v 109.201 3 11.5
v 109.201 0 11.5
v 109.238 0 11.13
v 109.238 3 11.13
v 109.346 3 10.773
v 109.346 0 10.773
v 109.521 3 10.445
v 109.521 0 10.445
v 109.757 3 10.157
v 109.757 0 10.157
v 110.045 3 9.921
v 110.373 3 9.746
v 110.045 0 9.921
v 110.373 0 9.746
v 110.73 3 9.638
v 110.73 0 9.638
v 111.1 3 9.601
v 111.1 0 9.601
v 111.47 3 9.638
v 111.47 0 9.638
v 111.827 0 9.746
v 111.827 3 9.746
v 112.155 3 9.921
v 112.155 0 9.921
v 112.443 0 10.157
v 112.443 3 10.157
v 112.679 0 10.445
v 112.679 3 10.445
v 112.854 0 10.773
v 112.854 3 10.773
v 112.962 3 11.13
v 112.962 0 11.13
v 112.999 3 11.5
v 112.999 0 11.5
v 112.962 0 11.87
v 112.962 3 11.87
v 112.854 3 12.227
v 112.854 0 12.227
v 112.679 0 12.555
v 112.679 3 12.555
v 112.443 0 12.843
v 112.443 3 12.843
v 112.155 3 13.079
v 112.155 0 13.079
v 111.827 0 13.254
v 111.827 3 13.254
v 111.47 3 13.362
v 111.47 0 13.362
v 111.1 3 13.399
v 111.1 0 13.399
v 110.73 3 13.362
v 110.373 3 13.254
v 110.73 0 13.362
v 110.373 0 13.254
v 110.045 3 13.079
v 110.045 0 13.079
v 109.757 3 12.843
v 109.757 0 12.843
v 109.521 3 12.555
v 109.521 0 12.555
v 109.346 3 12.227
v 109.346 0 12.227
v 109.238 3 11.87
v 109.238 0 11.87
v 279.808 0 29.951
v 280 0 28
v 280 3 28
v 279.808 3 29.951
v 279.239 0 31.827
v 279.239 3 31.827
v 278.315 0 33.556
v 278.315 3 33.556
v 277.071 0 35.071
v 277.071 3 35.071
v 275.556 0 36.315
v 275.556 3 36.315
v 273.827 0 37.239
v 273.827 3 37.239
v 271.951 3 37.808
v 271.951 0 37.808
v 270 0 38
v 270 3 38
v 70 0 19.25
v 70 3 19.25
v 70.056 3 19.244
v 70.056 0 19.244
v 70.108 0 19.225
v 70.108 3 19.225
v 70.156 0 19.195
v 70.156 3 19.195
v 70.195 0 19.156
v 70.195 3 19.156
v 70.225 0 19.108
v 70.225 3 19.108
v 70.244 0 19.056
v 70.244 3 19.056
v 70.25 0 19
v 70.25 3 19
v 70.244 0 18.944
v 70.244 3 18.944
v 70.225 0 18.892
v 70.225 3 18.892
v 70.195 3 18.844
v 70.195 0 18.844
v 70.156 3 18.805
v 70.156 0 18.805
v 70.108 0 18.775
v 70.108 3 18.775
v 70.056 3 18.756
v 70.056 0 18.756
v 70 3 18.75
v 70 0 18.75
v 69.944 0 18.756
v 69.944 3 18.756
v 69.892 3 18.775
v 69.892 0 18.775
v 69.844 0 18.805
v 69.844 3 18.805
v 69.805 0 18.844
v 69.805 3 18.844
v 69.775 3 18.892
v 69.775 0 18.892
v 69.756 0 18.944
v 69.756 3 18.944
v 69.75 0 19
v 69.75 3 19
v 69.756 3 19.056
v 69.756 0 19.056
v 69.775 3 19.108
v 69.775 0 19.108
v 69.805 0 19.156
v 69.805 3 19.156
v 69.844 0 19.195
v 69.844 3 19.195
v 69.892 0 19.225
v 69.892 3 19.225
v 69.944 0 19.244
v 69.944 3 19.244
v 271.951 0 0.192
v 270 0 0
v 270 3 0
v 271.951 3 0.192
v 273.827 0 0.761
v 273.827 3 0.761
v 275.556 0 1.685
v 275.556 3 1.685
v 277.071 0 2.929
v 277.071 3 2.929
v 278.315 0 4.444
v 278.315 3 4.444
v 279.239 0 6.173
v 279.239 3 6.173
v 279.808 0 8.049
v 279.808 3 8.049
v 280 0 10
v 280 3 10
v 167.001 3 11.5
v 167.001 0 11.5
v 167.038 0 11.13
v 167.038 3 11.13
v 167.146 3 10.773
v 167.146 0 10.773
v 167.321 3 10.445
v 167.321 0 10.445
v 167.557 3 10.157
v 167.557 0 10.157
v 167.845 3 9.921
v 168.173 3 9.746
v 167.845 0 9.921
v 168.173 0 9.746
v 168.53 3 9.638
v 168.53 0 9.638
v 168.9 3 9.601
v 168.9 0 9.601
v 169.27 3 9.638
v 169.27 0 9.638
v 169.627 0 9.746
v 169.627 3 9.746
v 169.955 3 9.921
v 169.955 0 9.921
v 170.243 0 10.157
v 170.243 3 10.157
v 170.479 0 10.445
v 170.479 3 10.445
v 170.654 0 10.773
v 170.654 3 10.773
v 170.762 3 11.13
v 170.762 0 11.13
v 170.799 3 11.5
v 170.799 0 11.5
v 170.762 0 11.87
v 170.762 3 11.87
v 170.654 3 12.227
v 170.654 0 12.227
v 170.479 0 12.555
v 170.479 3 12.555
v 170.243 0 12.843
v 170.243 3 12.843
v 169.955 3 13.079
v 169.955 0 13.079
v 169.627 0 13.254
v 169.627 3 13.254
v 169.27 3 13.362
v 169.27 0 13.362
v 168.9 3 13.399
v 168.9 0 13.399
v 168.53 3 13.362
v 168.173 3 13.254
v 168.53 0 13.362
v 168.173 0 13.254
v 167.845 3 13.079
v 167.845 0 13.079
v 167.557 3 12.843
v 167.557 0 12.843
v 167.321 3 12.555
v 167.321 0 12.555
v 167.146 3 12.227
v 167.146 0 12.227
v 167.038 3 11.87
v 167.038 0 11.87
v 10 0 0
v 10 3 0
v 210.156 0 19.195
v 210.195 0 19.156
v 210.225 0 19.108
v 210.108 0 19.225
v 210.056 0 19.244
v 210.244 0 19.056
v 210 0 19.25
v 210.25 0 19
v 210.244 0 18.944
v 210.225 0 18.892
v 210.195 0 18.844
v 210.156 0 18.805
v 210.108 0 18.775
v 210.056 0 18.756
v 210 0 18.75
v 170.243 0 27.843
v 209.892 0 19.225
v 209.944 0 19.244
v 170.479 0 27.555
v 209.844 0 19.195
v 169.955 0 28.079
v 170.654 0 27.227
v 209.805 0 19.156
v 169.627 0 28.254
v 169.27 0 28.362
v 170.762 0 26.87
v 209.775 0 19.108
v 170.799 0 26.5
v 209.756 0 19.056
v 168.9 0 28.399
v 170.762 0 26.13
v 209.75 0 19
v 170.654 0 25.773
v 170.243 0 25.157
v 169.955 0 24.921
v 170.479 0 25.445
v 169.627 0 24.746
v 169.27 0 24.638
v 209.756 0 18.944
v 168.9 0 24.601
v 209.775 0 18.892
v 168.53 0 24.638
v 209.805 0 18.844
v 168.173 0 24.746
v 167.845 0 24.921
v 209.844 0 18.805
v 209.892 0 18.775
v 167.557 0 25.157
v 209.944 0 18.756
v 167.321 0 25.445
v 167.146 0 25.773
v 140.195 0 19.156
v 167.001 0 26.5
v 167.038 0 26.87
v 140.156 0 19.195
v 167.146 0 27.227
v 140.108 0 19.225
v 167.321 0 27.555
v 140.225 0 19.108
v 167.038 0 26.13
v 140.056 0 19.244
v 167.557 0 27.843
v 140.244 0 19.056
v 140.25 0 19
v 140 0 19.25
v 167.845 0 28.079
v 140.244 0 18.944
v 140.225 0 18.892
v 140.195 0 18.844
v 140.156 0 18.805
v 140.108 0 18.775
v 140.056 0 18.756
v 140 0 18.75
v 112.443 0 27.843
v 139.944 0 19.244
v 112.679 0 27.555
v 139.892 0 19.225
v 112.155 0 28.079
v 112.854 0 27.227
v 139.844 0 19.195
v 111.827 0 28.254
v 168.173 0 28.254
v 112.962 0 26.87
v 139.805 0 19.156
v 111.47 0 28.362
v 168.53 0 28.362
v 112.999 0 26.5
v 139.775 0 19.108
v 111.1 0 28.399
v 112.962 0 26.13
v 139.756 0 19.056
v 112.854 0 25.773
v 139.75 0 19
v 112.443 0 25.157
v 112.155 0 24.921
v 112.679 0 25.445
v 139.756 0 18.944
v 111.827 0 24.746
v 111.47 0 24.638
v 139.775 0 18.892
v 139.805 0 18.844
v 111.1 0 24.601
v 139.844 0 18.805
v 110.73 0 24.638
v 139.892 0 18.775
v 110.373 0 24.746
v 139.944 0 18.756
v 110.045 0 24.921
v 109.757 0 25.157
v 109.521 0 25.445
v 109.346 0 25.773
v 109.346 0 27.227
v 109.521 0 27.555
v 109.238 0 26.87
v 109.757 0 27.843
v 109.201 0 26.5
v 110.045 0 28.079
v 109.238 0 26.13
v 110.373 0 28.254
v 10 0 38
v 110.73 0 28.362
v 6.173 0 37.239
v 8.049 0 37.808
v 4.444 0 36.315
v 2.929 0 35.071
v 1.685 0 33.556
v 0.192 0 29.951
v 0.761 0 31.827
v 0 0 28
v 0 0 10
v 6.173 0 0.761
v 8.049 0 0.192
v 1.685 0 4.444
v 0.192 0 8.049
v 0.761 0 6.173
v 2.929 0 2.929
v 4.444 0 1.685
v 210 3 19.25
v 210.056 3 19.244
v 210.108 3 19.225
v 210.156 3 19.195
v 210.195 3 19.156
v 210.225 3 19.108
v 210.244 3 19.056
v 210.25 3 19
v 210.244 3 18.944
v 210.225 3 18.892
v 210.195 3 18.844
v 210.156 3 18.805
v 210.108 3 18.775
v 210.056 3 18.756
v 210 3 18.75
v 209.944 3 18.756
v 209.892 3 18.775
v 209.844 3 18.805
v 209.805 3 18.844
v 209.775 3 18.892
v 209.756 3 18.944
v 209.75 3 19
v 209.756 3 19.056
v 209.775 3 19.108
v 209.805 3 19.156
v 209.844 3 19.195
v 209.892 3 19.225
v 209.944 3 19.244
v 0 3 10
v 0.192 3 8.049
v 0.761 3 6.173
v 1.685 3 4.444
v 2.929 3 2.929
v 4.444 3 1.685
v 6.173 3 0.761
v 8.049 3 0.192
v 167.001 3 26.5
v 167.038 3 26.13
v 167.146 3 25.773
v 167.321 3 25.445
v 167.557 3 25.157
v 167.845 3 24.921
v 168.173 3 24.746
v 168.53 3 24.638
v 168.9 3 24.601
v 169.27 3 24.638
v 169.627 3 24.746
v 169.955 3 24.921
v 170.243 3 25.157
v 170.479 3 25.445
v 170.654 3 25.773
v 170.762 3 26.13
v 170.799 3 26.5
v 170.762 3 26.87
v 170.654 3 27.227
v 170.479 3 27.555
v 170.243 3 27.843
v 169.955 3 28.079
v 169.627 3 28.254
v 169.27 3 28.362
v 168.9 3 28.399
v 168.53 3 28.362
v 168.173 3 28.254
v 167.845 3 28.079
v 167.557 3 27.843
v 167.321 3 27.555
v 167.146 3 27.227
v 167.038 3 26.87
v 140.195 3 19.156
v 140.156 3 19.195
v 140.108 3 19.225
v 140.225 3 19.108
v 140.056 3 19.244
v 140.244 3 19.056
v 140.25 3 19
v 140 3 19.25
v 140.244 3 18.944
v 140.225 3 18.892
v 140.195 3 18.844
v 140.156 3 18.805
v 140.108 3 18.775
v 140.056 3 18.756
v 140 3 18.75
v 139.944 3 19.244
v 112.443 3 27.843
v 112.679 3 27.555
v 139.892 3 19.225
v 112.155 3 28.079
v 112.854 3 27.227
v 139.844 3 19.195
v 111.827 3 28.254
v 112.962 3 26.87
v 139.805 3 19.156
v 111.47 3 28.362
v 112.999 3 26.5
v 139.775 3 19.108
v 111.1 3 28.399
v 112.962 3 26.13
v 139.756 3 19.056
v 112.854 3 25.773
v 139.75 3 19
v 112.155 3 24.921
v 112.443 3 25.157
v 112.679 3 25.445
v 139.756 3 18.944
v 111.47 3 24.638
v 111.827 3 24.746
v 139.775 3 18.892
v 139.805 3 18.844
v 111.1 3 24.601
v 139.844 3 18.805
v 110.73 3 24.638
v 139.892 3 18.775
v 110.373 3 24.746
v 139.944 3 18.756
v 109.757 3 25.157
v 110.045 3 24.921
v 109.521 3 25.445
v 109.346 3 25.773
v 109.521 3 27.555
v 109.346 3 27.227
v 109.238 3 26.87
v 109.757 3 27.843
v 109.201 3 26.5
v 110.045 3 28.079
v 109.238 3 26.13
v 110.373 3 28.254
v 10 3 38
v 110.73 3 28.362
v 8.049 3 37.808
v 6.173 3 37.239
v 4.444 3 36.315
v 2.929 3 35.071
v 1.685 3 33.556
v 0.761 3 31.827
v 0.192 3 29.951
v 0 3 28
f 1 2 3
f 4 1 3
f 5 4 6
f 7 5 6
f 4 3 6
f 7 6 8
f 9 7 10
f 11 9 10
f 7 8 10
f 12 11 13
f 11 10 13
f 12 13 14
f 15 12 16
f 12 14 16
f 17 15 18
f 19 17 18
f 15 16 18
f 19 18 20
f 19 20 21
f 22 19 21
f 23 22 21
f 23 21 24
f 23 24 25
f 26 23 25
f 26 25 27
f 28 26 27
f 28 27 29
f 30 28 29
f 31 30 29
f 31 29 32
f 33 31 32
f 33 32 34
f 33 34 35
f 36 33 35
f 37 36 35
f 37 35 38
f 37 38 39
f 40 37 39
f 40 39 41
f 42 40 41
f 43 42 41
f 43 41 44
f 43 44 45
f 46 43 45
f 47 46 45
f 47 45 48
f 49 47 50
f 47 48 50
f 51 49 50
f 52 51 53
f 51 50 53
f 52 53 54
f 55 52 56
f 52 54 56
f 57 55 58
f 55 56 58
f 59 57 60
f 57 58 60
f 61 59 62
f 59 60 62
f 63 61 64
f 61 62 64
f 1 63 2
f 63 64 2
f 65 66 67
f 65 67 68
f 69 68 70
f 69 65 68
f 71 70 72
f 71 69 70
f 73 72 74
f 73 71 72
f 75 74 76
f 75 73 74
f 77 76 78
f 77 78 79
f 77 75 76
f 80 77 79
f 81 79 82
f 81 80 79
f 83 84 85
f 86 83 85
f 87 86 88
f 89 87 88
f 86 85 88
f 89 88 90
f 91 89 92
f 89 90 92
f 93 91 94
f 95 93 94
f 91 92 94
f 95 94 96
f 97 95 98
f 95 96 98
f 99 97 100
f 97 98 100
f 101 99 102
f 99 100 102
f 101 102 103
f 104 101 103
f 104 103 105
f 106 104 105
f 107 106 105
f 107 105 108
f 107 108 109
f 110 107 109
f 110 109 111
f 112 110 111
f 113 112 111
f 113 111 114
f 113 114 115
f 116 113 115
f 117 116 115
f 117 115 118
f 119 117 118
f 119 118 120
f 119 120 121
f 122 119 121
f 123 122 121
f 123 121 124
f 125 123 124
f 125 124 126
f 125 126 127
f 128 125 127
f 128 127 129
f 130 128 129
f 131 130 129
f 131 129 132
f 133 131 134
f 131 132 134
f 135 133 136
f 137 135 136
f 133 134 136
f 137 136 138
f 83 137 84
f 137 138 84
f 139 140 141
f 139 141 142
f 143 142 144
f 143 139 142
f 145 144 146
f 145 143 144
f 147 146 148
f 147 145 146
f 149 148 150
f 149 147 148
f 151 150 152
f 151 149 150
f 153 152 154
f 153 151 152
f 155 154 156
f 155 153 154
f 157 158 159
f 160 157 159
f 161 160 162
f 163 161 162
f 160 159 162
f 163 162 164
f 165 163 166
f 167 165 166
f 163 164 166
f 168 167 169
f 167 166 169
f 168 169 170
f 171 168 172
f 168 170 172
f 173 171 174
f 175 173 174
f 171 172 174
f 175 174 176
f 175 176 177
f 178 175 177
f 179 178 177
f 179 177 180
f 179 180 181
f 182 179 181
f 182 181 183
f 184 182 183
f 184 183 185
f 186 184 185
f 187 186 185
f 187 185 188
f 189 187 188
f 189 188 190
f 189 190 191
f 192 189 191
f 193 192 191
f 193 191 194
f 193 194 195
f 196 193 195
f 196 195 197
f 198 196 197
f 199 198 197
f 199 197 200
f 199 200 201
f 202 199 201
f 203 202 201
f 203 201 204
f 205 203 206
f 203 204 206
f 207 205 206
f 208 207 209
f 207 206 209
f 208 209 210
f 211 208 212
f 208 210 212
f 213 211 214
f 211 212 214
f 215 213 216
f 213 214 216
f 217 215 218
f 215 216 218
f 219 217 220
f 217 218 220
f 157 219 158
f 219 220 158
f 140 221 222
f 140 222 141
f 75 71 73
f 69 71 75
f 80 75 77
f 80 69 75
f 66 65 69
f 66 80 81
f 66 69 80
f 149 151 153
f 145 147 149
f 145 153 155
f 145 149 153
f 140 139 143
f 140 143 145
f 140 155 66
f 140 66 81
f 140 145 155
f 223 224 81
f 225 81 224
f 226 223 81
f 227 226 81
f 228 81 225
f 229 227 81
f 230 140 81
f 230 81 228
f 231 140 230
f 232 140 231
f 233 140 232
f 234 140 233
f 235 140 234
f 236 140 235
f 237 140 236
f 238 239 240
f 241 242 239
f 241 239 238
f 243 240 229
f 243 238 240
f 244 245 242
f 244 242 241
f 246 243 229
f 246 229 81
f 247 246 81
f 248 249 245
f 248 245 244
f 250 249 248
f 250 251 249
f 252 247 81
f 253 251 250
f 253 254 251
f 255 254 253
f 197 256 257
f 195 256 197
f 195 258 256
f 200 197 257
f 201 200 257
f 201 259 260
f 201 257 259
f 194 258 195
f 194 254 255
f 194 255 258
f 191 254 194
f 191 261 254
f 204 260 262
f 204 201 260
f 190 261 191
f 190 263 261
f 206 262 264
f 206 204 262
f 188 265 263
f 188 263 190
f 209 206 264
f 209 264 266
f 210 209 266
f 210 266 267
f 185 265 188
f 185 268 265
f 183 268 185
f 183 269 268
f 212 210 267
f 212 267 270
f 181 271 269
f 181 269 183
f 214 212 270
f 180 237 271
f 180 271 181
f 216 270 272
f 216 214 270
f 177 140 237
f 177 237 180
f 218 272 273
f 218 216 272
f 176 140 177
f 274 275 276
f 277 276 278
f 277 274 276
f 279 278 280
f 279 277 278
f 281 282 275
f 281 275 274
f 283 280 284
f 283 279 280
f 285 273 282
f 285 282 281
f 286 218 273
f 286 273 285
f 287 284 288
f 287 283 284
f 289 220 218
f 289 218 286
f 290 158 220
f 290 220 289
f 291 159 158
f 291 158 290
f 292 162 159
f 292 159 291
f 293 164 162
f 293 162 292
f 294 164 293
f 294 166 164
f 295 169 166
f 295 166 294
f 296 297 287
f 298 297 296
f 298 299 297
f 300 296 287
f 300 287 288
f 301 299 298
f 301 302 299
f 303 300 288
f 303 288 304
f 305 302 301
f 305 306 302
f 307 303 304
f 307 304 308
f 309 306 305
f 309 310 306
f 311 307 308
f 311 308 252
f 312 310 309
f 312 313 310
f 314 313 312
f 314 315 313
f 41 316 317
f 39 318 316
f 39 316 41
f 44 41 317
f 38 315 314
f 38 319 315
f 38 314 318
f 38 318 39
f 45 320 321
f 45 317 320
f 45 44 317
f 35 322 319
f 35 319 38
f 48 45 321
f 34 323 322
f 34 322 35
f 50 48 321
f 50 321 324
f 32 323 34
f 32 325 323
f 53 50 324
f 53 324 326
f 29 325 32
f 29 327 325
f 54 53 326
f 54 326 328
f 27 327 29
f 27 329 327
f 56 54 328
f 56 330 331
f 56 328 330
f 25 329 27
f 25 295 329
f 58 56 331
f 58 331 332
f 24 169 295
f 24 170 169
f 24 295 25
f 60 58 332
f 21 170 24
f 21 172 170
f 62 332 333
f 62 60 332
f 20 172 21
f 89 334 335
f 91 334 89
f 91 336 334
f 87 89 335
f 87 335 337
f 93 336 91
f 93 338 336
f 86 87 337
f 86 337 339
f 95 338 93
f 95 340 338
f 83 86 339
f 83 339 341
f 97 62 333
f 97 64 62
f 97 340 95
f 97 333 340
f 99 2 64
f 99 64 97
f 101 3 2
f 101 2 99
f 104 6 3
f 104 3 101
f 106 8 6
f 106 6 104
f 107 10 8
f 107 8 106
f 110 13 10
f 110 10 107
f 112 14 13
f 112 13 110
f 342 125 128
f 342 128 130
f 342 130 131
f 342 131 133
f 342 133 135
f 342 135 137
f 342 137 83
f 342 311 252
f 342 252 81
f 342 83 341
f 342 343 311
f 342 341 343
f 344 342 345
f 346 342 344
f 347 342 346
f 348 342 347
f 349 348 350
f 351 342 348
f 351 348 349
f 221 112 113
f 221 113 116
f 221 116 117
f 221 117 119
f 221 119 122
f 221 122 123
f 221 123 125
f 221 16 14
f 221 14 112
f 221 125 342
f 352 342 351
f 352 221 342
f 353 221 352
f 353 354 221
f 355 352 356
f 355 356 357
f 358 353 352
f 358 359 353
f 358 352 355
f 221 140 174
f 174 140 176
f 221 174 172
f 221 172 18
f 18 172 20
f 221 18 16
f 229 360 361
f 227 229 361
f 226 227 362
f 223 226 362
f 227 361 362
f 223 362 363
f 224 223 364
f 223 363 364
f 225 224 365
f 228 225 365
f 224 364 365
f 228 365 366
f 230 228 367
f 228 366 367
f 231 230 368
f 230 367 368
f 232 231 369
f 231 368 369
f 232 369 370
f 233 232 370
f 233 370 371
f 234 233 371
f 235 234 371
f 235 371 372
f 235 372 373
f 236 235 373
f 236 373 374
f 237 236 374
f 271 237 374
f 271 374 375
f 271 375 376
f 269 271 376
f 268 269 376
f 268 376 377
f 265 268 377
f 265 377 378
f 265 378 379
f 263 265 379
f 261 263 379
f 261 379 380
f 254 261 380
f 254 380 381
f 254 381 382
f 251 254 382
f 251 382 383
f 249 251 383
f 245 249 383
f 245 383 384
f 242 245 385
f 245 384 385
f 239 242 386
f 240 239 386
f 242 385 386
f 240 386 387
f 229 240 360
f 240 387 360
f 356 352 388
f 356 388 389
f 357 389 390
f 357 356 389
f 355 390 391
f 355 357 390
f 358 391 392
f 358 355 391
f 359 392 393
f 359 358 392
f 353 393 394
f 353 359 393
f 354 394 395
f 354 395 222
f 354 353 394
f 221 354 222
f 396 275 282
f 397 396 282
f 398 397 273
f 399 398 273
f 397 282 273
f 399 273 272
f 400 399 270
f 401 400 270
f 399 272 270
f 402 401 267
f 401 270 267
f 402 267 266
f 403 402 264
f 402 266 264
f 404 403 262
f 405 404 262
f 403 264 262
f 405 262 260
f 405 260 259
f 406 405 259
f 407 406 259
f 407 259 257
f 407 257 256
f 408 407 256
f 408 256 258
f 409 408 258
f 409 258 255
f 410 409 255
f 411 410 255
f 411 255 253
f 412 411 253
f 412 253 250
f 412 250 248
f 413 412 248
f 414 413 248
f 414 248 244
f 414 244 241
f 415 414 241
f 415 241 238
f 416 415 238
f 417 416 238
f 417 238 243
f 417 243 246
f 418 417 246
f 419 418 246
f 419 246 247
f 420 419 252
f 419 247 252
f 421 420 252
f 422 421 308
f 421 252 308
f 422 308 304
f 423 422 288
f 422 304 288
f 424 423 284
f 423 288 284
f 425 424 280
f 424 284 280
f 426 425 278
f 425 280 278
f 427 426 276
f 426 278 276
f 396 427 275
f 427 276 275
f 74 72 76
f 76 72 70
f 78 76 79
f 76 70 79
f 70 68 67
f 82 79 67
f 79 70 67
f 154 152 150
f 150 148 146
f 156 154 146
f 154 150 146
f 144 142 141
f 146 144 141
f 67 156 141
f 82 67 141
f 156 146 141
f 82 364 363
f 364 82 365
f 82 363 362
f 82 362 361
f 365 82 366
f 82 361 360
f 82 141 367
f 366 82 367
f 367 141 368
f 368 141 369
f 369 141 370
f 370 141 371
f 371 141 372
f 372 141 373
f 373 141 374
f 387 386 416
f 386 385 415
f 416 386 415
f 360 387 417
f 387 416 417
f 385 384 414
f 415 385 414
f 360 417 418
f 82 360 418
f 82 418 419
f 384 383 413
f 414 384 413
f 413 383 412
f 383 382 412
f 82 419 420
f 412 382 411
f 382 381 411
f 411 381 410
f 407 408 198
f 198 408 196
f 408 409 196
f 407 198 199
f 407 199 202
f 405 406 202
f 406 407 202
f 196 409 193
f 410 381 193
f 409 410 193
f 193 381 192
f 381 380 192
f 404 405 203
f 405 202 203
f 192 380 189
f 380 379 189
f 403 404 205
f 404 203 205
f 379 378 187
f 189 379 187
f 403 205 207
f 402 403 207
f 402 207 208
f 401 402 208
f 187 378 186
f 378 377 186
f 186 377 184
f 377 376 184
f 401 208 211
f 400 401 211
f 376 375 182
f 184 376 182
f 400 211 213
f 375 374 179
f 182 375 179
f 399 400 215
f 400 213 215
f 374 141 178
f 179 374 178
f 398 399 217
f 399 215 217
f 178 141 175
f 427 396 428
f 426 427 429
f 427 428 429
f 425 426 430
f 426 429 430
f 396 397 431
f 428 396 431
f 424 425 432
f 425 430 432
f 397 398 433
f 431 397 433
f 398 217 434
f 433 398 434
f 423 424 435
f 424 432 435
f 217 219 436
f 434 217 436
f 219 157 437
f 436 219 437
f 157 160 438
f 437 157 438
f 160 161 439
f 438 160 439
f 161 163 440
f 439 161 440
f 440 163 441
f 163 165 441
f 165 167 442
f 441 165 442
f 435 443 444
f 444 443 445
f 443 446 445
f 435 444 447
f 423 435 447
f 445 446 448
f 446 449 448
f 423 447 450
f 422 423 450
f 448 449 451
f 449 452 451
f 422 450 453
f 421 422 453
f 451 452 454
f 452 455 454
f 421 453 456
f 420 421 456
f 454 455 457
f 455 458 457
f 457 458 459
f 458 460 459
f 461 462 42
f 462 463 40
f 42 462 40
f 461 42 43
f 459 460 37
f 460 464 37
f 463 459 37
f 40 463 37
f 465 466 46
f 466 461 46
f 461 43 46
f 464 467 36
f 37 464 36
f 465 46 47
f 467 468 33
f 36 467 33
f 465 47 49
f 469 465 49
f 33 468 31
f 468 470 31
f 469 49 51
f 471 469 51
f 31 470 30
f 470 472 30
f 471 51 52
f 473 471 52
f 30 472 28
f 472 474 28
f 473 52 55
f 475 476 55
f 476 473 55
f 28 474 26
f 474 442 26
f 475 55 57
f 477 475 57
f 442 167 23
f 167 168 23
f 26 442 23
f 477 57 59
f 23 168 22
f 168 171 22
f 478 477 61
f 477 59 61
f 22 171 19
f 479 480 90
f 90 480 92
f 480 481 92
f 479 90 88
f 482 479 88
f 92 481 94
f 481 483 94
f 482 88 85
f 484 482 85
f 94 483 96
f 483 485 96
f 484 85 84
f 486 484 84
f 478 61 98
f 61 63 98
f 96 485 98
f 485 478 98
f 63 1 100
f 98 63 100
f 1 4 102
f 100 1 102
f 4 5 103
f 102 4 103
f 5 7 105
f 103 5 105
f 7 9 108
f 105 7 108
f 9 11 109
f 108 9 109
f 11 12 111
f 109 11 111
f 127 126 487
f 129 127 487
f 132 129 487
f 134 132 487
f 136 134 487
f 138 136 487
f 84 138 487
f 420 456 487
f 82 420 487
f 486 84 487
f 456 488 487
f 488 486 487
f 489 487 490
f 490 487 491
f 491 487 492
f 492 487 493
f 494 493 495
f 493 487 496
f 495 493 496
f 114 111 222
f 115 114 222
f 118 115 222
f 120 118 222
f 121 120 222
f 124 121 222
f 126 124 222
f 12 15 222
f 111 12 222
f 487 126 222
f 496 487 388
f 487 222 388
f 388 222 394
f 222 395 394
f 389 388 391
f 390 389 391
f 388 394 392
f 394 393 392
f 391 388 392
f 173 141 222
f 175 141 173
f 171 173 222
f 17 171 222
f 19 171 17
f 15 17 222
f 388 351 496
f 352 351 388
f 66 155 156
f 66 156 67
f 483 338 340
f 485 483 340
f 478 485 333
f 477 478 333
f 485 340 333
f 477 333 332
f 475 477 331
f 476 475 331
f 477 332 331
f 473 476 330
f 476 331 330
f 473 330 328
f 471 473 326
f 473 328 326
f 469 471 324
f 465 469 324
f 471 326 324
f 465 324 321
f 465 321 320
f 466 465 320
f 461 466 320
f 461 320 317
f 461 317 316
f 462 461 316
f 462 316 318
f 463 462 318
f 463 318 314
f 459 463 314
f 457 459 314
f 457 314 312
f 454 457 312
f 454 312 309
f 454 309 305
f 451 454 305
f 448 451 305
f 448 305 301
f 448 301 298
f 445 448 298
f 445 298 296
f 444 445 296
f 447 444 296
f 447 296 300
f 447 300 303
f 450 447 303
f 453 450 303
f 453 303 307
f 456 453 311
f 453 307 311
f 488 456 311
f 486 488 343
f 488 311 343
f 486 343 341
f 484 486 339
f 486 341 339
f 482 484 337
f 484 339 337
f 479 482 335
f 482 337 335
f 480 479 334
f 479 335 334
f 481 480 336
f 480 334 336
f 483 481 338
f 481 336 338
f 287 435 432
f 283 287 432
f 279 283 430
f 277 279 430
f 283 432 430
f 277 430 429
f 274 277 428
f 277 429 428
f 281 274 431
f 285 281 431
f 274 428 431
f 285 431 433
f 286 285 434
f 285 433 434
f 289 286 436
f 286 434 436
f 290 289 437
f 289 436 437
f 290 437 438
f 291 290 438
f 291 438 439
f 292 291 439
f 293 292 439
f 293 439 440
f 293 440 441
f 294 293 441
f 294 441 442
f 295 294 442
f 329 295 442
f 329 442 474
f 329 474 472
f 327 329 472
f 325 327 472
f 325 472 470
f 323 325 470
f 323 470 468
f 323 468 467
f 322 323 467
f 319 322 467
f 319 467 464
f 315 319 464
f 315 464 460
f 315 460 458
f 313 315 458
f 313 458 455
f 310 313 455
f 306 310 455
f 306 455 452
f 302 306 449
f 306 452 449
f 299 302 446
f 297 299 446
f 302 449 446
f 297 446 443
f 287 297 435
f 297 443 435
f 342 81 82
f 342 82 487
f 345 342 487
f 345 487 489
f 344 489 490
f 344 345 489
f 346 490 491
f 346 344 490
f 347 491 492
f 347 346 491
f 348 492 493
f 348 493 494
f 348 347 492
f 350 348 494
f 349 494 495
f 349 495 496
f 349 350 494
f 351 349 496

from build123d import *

# Parameters (mm, degrees)
BOSS_EXTRUDE1_DEPTH   = 3
F_6_CLEARANCE_HOLE1_D = 3.7973
SKETCH4_R             = 0.25
CUT_EXTRUDE1_DEPTH    = 10


with BuildPart() as part:
    # Sketch1 → Boss-Extrude1 (new body)
    with BuildSketch(Plane(origin=(0, 0, 0), x_dir=(1, 0, 0), z_dir=(0, 1, 0))):
        with BuildLine():
            Line((10, 0), (270, 0))
            ThreePointArc((270, 0), (277.071067812, -2.928932188), (280, -10))
            Line((280, -10), (280, -28))
            ThreePointArc((280, -28), (277.071067812, -35.071067812), (270, -38))
            Line((270, -38), (10, -38))
            ThreePointArc((10, -38), (2.928932188, -35.071067812), (0, -28))
            Line((0, -28), (0, -10))
            ThreePointArc((0, -10), (2.928932188, -2.928932188), (10, 0))
        make_face()
    extrude(amount=BOSS_EXTRUDE1_DEPTH)

    # #6 Clearance Hole1 (through all)
    with Locations(Plane(origin=(0, 3, 0), x_dir=(1, 0, 0), z_dir=(0, 1, 0))):
        with Locations((111.1, -11.5), (111.1, -26.5), (168.9, -26.5), (168.9, -11.5)):
            Hole(F_6_CLEARANCE_HOLE1_D / 2)

    # Sketch4 → Cut-Extrude1 (cut)
    with BuildSketch(Plane(origin=(0, 3, 0), x_dir=(1, 0, 0), z_dir=(0, 1, 0))):
        with Locations(Location((70, -19, 0), (0, 0, 270))):
            Circle(SKETCH4_R)
        with Locations(Location((140, -19, 0), (0, 0, 270))):
            Circle(SKETCH4_R)
        with Locations(Location((210, -19, 0), (0, 0, 270))):
            Circle(SKETCH4_R)
    extrude(amount=-CUT_EXTRUDE1_DEPTH, mode=Mode.SUBTRACT)


solid = part.part
